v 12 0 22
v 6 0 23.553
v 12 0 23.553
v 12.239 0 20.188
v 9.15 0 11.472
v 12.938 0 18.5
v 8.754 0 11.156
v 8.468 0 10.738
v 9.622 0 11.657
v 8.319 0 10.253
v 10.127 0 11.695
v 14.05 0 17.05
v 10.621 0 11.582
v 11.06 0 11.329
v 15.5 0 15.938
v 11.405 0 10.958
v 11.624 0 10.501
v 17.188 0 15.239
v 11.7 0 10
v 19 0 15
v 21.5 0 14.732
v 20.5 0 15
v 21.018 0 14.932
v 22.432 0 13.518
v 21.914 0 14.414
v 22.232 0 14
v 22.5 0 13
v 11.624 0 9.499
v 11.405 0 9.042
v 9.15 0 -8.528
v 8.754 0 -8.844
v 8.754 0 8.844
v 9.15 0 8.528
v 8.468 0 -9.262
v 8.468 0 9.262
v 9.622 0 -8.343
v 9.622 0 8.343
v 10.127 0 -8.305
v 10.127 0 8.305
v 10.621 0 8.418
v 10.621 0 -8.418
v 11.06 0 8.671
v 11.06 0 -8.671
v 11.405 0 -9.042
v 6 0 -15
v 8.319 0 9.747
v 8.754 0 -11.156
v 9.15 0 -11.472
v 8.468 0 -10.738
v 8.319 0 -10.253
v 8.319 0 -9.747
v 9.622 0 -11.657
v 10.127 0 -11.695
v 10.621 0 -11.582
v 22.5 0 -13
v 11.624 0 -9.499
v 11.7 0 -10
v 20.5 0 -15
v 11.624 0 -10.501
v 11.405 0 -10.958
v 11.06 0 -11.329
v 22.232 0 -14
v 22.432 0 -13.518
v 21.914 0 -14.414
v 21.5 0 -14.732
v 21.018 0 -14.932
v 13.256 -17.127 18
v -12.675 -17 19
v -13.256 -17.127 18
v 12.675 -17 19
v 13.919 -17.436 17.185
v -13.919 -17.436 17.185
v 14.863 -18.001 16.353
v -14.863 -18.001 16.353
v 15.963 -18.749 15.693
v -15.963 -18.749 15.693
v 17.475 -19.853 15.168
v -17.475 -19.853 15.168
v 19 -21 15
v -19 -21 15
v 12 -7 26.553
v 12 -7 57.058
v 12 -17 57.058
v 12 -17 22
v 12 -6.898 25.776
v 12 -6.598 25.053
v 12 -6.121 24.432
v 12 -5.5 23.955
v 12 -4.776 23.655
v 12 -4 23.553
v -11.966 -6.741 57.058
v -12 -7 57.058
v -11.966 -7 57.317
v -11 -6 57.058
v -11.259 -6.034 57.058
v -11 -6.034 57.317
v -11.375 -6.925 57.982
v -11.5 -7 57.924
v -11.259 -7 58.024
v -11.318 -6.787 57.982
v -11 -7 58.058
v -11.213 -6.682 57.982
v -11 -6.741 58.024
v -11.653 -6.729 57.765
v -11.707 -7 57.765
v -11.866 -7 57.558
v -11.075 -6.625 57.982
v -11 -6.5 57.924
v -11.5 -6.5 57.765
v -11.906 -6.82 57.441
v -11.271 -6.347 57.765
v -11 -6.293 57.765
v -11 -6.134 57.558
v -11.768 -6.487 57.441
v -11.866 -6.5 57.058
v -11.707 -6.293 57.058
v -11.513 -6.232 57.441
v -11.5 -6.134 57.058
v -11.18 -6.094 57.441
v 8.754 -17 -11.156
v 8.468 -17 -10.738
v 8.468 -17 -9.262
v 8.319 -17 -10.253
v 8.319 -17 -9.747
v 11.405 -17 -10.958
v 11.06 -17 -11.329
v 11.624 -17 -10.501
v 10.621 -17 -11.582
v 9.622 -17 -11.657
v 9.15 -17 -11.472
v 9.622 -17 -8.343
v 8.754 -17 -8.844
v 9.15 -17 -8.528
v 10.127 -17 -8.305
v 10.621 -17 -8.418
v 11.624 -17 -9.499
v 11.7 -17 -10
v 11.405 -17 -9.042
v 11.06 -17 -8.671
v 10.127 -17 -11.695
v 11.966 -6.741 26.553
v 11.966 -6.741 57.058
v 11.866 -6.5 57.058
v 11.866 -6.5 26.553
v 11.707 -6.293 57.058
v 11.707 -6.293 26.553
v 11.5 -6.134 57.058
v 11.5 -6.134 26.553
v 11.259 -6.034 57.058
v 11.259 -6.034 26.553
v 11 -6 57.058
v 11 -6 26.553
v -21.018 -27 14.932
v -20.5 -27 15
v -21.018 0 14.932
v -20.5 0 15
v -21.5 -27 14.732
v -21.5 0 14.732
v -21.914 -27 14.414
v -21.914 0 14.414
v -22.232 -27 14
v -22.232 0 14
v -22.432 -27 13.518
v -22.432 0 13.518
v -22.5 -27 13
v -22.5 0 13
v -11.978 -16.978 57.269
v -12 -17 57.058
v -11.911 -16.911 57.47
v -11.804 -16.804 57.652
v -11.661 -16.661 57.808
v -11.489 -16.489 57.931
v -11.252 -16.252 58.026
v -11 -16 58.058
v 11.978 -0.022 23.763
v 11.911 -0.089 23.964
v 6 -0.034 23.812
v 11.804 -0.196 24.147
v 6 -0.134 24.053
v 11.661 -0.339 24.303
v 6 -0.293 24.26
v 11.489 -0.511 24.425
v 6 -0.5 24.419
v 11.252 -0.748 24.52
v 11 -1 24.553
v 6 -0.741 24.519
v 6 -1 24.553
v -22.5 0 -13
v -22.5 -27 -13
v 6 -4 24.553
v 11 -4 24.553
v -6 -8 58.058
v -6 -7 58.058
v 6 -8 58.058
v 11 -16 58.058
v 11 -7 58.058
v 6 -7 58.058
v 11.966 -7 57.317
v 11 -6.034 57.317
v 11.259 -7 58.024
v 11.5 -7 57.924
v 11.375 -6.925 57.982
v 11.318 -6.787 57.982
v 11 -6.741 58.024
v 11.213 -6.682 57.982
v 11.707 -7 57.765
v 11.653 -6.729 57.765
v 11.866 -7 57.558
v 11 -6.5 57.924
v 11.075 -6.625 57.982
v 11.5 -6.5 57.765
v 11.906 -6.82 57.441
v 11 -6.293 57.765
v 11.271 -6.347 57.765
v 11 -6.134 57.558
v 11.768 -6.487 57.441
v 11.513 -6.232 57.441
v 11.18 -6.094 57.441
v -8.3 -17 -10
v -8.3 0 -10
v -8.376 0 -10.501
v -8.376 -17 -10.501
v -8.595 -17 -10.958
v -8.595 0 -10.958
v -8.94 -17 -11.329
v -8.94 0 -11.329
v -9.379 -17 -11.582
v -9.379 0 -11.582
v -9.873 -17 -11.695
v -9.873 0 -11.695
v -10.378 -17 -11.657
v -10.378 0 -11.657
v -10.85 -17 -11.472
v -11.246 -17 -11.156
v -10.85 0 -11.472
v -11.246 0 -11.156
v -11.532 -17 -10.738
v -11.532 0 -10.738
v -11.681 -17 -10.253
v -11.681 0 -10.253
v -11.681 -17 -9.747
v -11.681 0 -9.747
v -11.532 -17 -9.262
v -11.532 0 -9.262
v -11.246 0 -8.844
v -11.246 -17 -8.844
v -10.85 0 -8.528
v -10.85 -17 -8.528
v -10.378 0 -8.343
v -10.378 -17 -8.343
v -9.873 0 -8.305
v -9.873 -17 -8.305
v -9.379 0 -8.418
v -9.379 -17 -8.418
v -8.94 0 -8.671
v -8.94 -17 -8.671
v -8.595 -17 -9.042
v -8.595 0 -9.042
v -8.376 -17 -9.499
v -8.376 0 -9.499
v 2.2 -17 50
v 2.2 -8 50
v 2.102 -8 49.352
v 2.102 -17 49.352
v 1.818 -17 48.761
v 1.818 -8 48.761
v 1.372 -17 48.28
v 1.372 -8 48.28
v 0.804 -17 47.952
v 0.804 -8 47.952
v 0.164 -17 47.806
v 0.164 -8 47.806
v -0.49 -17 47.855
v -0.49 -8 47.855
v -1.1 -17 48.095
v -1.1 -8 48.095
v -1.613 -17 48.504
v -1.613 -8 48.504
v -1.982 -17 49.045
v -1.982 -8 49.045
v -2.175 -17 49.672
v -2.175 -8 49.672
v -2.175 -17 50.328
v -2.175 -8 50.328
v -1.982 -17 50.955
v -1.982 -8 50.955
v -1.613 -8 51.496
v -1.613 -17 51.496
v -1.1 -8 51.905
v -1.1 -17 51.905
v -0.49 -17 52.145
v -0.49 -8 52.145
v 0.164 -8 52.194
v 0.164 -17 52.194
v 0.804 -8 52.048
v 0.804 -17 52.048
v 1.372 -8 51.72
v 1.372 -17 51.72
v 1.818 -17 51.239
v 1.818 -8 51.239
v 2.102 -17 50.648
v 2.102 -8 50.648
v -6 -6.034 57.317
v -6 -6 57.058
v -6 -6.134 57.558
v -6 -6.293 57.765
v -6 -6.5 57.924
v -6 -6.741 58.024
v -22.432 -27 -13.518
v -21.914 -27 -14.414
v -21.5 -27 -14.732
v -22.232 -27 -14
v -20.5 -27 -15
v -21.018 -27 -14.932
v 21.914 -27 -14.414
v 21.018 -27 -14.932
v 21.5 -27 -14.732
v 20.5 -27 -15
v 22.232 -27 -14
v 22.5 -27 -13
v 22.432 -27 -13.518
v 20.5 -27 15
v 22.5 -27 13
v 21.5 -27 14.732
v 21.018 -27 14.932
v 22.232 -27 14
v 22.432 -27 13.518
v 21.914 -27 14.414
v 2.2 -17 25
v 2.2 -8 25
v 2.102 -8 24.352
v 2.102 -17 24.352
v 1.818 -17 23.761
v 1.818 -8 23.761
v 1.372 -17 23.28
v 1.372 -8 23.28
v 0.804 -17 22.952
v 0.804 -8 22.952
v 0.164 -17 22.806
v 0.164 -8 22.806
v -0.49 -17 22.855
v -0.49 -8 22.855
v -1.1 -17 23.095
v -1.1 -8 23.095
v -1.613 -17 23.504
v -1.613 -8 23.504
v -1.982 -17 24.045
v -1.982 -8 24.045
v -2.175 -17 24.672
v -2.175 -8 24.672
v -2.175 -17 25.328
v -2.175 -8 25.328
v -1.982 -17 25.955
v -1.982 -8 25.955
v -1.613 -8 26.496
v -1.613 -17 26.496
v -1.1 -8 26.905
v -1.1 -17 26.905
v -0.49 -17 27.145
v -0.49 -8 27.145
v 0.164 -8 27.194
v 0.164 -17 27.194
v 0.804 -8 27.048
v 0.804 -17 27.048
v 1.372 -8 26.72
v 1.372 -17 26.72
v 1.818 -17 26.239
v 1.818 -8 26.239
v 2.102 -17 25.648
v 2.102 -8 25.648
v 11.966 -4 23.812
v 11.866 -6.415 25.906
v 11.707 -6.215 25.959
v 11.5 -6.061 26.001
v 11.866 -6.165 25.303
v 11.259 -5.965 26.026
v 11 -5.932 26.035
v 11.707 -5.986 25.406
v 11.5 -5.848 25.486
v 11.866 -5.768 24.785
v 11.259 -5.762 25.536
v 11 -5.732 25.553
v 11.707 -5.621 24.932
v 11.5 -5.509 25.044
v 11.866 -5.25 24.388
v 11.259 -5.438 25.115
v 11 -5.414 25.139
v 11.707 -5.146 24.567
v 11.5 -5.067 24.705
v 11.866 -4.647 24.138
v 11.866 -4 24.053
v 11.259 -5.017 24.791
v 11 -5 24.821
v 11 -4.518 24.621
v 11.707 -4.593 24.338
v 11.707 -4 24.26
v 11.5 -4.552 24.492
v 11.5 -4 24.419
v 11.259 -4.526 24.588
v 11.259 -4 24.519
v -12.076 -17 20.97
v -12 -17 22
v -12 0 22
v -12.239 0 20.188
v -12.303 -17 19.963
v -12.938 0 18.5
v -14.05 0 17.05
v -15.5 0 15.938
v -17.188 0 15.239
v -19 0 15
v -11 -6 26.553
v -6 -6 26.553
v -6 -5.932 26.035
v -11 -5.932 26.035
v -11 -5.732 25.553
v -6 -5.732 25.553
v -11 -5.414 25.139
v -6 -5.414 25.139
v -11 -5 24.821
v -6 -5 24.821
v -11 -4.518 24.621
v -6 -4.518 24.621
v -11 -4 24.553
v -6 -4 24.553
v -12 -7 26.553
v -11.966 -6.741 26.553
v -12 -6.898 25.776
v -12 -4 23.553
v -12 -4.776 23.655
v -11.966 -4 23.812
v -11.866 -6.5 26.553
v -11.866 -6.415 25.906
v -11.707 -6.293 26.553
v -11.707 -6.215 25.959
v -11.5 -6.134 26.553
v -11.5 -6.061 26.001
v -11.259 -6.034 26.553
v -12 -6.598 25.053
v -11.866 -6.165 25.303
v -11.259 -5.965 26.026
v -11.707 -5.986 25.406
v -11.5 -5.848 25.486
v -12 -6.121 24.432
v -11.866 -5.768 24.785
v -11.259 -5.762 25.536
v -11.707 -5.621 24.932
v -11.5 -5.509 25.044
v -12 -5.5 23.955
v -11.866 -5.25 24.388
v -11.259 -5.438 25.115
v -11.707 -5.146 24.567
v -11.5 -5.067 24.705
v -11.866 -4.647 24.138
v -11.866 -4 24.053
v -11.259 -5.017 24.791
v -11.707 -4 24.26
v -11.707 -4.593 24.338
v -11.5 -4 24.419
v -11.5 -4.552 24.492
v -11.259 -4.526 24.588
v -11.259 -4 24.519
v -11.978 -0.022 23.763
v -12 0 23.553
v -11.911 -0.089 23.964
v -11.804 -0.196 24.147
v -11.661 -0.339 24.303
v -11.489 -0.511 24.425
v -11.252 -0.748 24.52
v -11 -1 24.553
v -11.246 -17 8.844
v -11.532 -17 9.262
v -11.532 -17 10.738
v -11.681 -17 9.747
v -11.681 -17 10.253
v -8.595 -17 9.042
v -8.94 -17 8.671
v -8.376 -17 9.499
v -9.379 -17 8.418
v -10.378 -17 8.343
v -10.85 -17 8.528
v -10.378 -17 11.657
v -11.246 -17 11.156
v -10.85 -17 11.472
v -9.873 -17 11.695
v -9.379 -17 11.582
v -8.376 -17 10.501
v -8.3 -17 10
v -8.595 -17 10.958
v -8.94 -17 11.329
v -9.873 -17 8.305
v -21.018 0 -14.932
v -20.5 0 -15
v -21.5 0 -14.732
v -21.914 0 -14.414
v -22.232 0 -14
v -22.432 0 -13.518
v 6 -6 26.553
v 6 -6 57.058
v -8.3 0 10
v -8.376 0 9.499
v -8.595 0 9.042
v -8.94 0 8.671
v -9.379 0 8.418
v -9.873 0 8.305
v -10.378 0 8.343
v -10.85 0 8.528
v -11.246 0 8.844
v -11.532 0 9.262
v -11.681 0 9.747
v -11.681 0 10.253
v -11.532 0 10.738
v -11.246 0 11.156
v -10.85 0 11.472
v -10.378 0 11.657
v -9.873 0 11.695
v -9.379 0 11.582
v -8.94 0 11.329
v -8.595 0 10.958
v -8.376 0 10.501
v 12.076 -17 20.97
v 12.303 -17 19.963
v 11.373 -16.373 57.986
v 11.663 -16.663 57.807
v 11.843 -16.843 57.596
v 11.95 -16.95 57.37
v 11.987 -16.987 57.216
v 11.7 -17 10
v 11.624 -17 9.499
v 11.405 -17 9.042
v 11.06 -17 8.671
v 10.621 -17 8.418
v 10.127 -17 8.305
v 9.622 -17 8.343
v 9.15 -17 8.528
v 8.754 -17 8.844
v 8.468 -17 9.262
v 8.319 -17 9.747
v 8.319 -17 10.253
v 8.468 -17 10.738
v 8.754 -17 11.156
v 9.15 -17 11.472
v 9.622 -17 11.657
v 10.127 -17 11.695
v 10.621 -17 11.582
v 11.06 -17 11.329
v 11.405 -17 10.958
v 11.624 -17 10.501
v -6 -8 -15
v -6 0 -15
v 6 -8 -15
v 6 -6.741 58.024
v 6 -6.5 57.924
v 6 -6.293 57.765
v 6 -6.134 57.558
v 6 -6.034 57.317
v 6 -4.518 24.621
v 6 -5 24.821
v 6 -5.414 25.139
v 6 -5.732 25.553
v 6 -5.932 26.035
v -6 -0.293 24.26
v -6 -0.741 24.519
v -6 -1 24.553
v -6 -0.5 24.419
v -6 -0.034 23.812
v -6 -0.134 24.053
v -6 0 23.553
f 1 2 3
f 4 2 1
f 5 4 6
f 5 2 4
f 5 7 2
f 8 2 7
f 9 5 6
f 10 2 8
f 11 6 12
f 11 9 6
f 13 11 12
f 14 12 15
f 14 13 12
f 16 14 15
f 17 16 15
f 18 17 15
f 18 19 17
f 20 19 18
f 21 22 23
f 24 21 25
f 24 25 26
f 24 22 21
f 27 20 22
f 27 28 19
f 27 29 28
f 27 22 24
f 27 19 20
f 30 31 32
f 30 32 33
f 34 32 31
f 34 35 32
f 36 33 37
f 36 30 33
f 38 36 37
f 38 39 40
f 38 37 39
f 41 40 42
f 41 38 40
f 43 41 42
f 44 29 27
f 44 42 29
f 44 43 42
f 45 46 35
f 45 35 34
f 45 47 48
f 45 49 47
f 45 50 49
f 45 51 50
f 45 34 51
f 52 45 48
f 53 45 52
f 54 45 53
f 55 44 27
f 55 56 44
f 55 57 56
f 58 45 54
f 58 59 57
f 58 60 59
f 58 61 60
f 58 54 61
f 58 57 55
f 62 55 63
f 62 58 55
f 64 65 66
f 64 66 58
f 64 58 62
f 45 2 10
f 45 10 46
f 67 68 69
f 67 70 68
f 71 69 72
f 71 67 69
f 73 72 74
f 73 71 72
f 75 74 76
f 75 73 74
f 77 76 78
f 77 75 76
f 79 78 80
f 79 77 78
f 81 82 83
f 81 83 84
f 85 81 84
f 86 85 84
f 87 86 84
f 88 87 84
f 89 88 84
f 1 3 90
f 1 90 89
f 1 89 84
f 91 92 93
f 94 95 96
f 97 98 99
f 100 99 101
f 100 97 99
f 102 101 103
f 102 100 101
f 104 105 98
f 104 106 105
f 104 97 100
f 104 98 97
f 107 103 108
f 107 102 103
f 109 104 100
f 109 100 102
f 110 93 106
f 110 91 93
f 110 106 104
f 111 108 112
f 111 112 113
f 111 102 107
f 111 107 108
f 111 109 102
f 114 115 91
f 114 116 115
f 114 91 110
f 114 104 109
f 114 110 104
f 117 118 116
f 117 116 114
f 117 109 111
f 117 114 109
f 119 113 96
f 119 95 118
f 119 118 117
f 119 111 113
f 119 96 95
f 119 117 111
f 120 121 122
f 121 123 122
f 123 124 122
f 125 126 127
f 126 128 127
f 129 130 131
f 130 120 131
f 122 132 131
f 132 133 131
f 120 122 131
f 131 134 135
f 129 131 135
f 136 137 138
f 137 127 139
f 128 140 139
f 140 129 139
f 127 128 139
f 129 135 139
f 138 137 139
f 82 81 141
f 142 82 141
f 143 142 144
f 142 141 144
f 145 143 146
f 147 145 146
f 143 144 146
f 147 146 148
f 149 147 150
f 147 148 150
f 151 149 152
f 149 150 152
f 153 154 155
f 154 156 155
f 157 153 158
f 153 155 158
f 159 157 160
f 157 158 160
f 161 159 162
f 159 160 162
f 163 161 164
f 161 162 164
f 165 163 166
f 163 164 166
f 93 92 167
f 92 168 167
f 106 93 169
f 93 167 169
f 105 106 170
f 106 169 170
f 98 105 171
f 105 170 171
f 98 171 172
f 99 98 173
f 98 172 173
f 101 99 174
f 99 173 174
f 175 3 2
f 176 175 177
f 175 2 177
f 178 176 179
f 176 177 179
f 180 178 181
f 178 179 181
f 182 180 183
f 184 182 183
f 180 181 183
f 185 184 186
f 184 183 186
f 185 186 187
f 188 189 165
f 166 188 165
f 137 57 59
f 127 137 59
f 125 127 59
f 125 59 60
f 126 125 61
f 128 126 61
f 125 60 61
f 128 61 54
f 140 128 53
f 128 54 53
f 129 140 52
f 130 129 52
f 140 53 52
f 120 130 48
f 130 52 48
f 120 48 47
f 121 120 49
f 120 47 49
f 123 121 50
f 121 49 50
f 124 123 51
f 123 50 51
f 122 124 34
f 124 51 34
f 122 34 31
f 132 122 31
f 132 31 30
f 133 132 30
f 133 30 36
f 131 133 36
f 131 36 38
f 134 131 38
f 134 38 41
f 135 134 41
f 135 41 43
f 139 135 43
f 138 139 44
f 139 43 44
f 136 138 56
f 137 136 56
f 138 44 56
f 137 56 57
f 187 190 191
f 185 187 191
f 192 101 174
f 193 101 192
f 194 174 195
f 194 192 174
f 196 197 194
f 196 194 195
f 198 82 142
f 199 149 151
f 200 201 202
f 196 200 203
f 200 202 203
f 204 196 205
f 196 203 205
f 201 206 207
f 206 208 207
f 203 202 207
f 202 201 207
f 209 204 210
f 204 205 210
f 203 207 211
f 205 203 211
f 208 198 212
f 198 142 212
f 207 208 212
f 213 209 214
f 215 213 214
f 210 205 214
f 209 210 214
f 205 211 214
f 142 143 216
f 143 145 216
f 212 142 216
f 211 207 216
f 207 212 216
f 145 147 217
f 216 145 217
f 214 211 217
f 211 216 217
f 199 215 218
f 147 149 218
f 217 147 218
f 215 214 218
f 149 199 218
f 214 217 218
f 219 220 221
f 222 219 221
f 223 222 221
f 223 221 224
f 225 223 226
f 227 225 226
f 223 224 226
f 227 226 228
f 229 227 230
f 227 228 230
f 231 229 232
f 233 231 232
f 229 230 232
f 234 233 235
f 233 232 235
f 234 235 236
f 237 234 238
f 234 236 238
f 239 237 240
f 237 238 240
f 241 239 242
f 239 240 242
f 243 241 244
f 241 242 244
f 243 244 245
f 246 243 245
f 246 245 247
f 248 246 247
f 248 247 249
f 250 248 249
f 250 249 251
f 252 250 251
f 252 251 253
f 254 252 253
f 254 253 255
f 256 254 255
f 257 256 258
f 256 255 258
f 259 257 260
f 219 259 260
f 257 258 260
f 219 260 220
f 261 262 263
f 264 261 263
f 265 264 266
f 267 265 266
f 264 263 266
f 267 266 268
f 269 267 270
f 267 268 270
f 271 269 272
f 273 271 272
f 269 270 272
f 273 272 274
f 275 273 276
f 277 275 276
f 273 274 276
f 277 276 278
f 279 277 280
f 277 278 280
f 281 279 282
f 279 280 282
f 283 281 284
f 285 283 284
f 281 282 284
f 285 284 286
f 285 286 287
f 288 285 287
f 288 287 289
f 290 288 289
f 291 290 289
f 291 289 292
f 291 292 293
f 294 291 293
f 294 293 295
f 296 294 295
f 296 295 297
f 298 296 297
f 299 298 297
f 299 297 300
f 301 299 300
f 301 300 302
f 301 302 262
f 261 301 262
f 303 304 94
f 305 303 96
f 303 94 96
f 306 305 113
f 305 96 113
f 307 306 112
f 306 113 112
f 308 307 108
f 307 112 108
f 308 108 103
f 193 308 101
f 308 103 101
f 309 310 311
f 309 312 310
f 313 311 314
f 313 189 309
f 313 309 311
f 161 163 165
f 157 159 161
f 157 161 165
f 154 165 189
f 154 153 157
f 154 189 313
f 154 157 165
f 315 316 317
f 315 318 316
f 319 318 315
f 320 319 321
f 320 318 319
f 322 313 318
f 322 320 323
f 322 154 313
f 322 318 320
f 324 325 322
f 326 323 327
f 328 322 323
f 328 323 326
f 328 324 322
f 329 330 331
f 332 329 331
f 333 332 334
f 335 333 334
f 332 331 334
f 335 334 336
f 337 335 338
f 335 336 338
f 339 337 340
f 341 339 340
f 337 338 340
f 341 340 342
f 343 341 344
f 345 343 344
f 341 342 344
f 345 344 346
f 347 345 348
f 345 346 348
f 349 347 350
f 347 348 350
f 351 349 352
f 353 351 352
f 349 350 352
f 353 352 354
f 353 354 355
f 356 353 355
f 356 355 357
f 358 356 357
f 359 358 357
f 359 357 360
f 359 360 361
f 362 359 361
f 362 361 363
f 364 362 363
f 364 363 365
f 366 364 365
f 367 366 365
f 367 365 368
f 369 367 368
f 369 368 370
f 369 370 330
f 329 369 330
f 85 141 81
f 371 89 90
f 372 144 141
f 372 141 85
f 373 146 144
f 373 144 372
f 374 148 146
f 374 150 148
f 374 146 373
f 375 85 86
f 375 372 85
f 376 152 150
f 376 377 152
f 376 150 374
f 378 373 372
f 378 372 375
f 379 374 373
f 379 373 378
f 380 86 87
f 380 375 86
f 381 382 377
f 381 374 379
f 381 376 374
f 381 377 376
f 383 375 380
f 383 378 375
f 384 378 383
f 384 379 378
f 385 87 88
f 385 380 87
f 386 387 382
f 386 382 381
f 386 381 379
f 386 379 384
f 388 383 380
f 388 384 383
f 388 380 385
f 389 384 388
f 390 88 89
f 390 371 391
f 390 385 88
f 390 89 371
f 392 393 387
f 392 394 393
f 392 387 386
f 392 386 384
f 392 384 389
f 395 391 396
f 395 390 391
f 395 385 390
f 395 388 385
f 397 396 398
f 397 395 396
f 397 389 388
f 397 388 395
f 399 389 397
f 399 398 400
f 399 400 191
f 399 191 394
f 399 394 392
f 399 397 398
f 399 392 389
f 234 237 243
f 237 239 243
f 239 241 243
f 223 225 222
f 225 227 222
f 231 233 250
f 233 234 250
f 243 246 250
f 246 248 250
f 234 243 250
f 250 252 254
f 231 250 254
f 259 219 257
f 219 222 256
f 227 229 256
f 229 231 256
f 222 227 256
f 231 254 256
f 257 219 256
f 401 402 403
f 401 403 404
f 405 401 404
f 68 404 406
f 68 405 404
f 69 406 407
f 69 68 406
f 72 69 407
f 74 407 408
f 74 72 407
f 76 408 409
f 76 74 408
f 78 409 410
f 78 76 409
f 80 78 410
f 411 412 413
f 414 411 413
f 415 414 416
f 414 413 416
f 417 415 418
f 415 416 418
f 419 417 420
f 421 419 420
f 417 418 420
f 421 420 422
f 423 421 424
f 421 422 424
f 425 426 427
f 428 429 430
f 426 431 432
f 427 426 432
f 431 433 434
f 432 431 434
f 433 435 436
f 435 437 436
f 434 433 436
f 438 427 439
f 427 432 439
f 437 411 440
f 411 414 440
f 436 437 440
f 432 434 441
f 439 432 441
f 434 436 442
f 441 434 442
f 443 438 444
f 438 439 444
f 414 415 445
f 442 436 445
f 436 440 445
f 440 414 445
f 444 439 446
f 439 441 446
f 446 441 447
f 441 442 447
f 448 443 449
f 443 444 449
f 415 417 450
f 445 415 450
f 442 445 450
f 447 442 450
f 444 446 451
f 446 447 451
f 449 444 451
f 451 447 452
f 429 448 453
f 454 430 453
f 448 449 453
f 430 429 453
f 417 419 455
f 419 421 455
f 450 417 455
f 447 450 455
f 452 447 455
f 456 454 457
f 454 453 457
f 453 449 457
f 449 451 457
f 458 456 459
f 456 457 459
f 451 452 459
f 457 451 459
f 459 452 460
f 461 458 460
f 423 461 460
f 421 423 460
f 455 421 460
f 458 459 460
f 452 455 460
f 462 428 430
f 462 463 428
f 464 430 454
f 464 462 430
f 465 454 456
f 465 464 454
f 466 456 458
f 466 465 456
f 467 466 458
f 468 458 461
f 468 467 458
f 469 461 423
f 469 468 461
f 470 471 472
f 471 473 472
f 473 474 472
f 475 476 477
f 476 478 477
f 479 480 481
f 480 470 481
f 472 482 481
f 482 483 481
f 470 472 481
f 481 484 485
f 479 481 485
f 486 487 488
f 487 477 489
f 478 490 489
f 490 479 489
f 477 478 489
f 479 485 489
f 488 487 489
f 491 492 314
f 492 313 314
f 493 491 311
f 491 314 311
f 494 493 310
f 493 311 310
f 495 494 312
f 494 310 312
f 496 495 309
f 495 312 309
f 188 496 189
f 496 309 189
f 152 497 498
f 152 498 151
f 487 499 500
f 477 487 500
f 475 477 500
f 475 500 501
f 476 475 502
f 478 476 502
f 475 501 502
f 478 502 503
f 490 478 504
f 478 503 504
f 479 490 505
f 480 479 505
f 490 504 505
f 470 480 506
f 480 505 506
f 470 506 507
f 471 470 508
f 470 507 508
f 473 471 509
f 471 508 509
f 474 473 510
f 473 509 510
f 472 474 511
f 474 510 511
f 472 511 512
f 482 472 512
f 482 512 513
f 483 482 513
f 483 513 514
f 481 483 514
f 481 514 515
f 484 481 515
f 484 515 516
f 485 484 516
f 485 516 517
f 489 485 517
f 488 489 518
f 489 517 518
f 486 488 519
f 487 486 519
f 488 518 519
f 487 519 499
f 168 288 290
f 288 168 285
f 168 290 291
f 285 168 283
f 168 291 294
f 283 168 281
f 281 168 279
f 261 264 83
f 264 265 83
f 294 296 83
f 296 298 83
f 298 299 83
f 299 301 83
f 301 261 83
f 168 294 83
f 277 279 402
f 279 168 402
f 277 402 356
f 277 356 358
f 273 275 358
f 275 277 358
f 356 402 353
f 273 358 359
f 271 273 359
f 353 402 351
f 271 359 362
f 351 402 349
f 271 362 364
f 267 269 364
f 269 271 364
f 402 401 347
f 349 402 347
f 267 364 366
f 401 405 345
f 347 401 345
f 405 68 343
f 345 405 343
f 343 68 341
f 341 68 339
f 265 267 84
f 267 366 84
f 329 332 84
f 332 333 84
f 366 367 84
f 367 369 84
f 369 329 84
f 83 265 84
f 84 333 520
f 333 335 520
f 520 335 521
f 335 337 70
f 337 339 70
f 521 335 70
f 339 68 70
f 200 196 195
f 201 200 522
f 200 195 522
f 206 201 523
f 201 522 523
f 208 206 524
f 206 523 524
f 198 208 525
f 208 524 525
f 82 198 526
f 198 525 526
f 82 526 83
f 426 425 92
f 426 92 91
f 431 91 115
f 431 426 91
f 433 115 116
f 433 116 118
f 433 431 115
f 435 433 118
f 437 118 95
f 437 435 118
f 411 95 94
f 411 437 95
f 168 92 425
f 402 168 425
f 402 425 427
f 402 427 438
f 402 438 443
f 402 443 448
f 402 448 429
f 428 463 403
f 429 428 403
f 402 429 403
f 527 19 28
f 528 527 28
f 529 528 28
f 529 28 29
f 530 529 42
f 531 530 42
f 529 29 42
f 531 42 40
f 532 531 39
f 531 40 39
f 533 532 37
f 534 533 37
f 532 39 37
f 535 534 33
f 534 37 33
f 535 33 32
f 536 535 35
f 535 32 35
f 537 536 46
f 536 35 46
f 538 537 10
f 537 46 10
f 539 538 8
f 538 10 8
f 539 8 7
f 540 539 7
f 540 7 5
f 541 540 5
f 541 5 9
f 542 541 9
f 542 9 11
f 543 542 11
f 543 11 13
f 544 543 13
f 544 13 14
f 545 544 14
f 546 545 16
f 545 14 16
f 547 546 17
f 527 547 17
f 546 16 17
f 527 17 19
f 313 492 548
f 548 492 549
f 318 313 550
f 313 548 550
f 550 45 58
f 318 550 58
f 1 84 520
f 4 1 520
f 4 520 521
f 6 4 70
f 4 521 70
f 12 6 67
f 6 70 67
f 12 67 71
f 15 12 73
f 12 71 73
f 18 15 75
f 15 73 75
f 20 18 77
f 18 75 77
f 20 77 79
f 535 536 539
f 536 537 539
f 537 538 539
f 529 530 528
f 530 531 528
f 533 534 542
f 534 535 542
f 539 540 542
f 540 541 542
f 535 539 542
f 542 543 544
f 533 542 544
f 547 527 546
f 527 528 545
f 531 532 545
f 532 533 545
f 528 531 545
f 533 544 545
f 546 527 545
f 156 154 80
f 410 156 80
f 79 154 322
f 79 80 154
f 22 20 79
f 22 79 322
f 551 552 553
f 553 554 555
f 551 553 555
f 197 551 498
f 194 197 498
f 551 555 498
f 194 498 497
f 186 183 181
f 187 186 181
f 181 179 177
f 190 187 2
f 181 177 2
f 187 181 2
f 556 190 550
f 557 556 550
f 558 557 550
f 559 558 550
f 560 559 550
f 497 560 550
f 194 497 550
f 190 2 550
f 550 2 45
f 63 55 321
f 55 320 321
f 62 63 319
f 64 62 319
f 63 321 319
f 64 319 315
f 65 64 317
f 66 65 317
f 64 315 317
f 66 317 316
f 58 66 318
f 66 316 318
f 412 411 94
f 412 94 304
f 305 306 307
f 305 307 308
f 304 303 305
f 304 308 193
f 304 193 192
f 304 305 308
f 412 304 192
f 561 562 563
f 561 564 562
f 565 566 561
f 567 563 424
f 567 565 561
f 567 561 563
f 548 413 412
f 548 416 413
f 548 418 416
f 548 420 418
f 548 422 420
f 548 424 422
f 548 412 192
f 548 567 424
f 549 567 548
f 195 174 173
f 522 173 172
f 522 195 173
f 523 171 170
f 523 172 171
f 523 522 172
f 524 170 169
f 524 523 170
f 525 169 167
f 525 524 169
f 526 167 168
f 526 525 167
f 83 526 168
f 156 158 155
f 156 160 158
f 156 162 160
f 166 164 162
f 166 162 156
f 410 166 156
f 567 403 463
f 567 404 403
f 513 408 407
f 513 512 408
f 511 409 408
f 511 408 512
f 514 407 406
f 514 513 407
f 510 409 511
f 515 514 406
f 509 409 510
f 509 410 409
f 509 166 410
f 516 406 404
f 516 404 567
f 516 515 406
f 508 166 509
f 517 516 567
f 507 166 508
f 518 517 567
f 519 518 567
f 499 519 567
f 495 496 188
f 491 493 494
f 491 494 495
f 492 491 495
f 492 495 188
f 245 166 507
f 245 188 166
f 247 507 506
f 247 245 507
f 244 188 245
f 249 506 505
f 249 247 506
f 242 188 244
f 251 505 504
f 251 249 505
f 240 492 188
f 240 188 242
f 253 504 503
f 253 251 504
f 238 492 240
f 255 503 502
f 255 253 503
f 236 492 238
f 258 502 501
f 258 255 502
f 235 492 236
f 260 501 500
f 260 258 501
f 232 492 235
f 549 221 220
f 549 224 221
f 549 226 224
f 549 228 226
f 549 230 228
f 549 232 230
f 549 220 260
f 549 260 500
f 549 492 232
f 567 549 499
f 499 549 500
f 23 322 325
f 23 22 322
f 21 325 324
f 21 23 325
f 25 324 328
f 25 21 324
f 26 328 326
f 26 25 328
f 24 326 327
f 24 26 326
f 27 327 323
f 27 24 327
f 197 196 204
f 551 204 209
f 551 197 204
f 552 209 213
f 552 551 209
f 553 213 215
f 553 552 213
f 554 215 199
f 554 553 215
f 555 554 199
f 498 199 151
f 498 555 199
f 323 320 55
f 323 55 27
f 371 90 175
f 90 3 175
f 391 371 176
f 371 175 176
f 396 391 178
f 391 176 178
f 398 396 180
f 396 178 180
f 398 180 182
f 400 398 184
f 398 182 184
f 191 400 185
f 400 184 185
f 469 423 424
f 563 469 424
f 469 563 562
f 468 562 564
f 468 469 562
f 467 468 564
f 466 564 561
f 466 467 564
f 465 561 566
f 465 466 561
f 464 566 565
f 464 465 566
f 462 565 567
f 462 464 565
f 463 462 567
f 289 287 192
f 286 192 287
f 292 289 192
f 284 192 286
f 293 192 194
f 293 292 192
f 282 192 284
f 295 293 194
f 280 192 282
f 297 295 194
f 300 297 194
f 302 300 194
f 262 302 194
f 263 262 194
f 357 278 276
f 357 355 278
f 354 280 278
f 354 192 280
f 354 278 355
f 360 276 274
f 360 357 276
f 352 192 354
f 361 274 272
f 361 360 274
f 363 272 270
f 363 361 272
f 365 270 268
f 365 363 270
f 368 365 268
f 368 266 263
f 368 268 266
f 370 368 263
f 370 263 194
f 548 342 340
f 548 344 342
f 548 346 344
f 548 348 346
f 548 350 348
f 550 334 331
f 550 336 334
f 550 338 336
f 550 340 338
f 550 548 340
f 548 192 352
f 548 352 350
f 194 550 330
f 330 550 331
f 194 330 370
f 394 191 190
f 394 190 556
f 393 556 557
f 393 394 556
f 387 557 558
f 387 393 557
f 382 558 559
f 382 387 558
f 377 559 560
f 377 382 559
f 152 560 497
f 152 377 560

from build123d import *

# Parameters (mm, degrees)
SKETCH1_W           = 45
SKETCH1_H           = 30
SKETCH1_R           = 1.7
SKETCH1_W_2         = 24
SKETCH1_H_2         = 43.058371989
SKETCH1_R_2         = 2.2
BOSS_EXTRUDE2_DEPTH = 17
SKETCH5_W           = 12
SKETCH5_H           = 100
CUT_EXTRUDE1_DEPTH  = 8
SKETCH7_W           = 29.697028674
SKETCH7_H           = 34.988499238
CUT_EXTRUDE2_DEPTH  = 7
SKETCH9_W           = 45
SKETCH9_H           = 30
BOSS_EXTRUDE3_DEPTH = 10
FILLET1_R           = 7
FILLET6_R           = 2
FILLET7_R           = 1
FILLET8_R           = 4


with BuildPart() as part:
    # Sketch1 → Boss-Extrude2 (new body)
    with BuildSketch(Plane(origin=(0, 0, 0), x_dir=(1, 0, 0), z_dir=(0, 1, 0))):
        Rectangle(SKETCH1_W, SKETCH1_H)
        with Locations((-10, 10)):
            Circle(SKETCH1_R, mode=Mode.SUBTRACT)
        with Locations((10, 10)):
            Circle(SKETCH1_R, mode=Mode.SUBTRACT)
        with Locations((10, -10)):
            Circle(SKETCH1_R, mode=Mode.SUBTRACT)
        with Locations((-10, -10)):
            Circle(SKETCH1_R, mode=Mode.SUBTRACT)
        with Locations((0, -36.529185995)):
            Rectangle(SKETCH1_W_2, SKETCH1_H_2)
        with Locations((0, -25)):
            Circle(SKETCH1_R_2, mode=Mode.SUBTRACT)
        with Locations((0, -50)):
            Circle(SKETCH1_R_2, mode=Mode.SUBTRACT)
    extrude(amount=-BOSS_EXTRUDE2_DEPTH)

    # Sketch5 → Cut-Extrude1 (cut)
    with BuildSketch(Plane(origin=(0, 0, 0), x_dir=(1, 0, 0), z_dir=(0, 1, 0))):
        with Locations((0, -16.465194583)):
            Rectangle(SKETCH5_W, SKETCH5_H)
    extrude(amount=-CUT_EXTRUDE1_DEPTH, mode=Mode.SUBTRACT)

    # Sketch7 → Cut-Extrude2 (cut, through all)
    with BuildSketch(Plane(origin=(0, -6, 0), x_dir=(1, 0, 0), z_dir=(0, 1, 0))):
        with Locations((-0.809918964, -42.047133079)):
            Rectangle(SKETCH7_W, SKETCH7_H)
    extrude(amount=CUT_EXTRUDE2_DEPTH, mode=Mode.SUBTRACT)

    # Sketch9 → Boss-Extrude3 (add)
    with BuildSketch(Plane.XZ.offset(17)):
        Rectangle(SKETCH9_W, SKETCH9_H)
    extrude(amount=BOSS_EXTRUDE3_DEPTH)

    # Fillet1
    fillet1_edges = [part.edges().sort_by_distance(p)[0] for p in [
        (-12, -8.5, 15),
        (12, -8.5, 15),
    ]]
    fillet(fillet1_edges, radius=FILLET1_R)

    # Fillet6
    fillet6_edges = [part.edges().sort_by_distance(p)[0] for p in [
        (22.5, -13.5, 15),
        (-22.5, -13.5, 15),
        (-22.5, -13.5, -15),
        (22.5, -13.5, -15),
        (9, -6, 24.55288346),
        (-9, -6, 24.55288346),
    ]]
    fillet(fillet6_edges, radius=FILLET6_R)

    # Fillet7
    fillet7_edges = [part.edges().sort_by_distance(p)[0] for p in [
        (-12, -2, 24.55288346),
        (12, -2, 24.55288346),
        (-12, -5.414213562, 25.138669897),
        (12, -5.414213562, 25.138669897),
        (-12, -11.5, 58.058371989),
        (12, -11.5, 58.058371989),
        (0, -17, 58.058371989),
        (9, 0, 24.55288346),
        (9, -6, 58.058371989),
        (12, -6, 42.305627724),
        (-9, 0, 24.55288346),
        (-9, -6, 58.058371989),
        (-12, -6, 42.305627724),
    ]]
    fillet(fillet7_edges, radius=FILLET7_R)

    # Fillet8
    fillet8_edges = [part.edges().sort_by_distance(p)[0] for p in [
        (0, -17, 15),
    ]]
    fillet(fillet8_edges, radius=FILLET8_R)


solid = part.part
